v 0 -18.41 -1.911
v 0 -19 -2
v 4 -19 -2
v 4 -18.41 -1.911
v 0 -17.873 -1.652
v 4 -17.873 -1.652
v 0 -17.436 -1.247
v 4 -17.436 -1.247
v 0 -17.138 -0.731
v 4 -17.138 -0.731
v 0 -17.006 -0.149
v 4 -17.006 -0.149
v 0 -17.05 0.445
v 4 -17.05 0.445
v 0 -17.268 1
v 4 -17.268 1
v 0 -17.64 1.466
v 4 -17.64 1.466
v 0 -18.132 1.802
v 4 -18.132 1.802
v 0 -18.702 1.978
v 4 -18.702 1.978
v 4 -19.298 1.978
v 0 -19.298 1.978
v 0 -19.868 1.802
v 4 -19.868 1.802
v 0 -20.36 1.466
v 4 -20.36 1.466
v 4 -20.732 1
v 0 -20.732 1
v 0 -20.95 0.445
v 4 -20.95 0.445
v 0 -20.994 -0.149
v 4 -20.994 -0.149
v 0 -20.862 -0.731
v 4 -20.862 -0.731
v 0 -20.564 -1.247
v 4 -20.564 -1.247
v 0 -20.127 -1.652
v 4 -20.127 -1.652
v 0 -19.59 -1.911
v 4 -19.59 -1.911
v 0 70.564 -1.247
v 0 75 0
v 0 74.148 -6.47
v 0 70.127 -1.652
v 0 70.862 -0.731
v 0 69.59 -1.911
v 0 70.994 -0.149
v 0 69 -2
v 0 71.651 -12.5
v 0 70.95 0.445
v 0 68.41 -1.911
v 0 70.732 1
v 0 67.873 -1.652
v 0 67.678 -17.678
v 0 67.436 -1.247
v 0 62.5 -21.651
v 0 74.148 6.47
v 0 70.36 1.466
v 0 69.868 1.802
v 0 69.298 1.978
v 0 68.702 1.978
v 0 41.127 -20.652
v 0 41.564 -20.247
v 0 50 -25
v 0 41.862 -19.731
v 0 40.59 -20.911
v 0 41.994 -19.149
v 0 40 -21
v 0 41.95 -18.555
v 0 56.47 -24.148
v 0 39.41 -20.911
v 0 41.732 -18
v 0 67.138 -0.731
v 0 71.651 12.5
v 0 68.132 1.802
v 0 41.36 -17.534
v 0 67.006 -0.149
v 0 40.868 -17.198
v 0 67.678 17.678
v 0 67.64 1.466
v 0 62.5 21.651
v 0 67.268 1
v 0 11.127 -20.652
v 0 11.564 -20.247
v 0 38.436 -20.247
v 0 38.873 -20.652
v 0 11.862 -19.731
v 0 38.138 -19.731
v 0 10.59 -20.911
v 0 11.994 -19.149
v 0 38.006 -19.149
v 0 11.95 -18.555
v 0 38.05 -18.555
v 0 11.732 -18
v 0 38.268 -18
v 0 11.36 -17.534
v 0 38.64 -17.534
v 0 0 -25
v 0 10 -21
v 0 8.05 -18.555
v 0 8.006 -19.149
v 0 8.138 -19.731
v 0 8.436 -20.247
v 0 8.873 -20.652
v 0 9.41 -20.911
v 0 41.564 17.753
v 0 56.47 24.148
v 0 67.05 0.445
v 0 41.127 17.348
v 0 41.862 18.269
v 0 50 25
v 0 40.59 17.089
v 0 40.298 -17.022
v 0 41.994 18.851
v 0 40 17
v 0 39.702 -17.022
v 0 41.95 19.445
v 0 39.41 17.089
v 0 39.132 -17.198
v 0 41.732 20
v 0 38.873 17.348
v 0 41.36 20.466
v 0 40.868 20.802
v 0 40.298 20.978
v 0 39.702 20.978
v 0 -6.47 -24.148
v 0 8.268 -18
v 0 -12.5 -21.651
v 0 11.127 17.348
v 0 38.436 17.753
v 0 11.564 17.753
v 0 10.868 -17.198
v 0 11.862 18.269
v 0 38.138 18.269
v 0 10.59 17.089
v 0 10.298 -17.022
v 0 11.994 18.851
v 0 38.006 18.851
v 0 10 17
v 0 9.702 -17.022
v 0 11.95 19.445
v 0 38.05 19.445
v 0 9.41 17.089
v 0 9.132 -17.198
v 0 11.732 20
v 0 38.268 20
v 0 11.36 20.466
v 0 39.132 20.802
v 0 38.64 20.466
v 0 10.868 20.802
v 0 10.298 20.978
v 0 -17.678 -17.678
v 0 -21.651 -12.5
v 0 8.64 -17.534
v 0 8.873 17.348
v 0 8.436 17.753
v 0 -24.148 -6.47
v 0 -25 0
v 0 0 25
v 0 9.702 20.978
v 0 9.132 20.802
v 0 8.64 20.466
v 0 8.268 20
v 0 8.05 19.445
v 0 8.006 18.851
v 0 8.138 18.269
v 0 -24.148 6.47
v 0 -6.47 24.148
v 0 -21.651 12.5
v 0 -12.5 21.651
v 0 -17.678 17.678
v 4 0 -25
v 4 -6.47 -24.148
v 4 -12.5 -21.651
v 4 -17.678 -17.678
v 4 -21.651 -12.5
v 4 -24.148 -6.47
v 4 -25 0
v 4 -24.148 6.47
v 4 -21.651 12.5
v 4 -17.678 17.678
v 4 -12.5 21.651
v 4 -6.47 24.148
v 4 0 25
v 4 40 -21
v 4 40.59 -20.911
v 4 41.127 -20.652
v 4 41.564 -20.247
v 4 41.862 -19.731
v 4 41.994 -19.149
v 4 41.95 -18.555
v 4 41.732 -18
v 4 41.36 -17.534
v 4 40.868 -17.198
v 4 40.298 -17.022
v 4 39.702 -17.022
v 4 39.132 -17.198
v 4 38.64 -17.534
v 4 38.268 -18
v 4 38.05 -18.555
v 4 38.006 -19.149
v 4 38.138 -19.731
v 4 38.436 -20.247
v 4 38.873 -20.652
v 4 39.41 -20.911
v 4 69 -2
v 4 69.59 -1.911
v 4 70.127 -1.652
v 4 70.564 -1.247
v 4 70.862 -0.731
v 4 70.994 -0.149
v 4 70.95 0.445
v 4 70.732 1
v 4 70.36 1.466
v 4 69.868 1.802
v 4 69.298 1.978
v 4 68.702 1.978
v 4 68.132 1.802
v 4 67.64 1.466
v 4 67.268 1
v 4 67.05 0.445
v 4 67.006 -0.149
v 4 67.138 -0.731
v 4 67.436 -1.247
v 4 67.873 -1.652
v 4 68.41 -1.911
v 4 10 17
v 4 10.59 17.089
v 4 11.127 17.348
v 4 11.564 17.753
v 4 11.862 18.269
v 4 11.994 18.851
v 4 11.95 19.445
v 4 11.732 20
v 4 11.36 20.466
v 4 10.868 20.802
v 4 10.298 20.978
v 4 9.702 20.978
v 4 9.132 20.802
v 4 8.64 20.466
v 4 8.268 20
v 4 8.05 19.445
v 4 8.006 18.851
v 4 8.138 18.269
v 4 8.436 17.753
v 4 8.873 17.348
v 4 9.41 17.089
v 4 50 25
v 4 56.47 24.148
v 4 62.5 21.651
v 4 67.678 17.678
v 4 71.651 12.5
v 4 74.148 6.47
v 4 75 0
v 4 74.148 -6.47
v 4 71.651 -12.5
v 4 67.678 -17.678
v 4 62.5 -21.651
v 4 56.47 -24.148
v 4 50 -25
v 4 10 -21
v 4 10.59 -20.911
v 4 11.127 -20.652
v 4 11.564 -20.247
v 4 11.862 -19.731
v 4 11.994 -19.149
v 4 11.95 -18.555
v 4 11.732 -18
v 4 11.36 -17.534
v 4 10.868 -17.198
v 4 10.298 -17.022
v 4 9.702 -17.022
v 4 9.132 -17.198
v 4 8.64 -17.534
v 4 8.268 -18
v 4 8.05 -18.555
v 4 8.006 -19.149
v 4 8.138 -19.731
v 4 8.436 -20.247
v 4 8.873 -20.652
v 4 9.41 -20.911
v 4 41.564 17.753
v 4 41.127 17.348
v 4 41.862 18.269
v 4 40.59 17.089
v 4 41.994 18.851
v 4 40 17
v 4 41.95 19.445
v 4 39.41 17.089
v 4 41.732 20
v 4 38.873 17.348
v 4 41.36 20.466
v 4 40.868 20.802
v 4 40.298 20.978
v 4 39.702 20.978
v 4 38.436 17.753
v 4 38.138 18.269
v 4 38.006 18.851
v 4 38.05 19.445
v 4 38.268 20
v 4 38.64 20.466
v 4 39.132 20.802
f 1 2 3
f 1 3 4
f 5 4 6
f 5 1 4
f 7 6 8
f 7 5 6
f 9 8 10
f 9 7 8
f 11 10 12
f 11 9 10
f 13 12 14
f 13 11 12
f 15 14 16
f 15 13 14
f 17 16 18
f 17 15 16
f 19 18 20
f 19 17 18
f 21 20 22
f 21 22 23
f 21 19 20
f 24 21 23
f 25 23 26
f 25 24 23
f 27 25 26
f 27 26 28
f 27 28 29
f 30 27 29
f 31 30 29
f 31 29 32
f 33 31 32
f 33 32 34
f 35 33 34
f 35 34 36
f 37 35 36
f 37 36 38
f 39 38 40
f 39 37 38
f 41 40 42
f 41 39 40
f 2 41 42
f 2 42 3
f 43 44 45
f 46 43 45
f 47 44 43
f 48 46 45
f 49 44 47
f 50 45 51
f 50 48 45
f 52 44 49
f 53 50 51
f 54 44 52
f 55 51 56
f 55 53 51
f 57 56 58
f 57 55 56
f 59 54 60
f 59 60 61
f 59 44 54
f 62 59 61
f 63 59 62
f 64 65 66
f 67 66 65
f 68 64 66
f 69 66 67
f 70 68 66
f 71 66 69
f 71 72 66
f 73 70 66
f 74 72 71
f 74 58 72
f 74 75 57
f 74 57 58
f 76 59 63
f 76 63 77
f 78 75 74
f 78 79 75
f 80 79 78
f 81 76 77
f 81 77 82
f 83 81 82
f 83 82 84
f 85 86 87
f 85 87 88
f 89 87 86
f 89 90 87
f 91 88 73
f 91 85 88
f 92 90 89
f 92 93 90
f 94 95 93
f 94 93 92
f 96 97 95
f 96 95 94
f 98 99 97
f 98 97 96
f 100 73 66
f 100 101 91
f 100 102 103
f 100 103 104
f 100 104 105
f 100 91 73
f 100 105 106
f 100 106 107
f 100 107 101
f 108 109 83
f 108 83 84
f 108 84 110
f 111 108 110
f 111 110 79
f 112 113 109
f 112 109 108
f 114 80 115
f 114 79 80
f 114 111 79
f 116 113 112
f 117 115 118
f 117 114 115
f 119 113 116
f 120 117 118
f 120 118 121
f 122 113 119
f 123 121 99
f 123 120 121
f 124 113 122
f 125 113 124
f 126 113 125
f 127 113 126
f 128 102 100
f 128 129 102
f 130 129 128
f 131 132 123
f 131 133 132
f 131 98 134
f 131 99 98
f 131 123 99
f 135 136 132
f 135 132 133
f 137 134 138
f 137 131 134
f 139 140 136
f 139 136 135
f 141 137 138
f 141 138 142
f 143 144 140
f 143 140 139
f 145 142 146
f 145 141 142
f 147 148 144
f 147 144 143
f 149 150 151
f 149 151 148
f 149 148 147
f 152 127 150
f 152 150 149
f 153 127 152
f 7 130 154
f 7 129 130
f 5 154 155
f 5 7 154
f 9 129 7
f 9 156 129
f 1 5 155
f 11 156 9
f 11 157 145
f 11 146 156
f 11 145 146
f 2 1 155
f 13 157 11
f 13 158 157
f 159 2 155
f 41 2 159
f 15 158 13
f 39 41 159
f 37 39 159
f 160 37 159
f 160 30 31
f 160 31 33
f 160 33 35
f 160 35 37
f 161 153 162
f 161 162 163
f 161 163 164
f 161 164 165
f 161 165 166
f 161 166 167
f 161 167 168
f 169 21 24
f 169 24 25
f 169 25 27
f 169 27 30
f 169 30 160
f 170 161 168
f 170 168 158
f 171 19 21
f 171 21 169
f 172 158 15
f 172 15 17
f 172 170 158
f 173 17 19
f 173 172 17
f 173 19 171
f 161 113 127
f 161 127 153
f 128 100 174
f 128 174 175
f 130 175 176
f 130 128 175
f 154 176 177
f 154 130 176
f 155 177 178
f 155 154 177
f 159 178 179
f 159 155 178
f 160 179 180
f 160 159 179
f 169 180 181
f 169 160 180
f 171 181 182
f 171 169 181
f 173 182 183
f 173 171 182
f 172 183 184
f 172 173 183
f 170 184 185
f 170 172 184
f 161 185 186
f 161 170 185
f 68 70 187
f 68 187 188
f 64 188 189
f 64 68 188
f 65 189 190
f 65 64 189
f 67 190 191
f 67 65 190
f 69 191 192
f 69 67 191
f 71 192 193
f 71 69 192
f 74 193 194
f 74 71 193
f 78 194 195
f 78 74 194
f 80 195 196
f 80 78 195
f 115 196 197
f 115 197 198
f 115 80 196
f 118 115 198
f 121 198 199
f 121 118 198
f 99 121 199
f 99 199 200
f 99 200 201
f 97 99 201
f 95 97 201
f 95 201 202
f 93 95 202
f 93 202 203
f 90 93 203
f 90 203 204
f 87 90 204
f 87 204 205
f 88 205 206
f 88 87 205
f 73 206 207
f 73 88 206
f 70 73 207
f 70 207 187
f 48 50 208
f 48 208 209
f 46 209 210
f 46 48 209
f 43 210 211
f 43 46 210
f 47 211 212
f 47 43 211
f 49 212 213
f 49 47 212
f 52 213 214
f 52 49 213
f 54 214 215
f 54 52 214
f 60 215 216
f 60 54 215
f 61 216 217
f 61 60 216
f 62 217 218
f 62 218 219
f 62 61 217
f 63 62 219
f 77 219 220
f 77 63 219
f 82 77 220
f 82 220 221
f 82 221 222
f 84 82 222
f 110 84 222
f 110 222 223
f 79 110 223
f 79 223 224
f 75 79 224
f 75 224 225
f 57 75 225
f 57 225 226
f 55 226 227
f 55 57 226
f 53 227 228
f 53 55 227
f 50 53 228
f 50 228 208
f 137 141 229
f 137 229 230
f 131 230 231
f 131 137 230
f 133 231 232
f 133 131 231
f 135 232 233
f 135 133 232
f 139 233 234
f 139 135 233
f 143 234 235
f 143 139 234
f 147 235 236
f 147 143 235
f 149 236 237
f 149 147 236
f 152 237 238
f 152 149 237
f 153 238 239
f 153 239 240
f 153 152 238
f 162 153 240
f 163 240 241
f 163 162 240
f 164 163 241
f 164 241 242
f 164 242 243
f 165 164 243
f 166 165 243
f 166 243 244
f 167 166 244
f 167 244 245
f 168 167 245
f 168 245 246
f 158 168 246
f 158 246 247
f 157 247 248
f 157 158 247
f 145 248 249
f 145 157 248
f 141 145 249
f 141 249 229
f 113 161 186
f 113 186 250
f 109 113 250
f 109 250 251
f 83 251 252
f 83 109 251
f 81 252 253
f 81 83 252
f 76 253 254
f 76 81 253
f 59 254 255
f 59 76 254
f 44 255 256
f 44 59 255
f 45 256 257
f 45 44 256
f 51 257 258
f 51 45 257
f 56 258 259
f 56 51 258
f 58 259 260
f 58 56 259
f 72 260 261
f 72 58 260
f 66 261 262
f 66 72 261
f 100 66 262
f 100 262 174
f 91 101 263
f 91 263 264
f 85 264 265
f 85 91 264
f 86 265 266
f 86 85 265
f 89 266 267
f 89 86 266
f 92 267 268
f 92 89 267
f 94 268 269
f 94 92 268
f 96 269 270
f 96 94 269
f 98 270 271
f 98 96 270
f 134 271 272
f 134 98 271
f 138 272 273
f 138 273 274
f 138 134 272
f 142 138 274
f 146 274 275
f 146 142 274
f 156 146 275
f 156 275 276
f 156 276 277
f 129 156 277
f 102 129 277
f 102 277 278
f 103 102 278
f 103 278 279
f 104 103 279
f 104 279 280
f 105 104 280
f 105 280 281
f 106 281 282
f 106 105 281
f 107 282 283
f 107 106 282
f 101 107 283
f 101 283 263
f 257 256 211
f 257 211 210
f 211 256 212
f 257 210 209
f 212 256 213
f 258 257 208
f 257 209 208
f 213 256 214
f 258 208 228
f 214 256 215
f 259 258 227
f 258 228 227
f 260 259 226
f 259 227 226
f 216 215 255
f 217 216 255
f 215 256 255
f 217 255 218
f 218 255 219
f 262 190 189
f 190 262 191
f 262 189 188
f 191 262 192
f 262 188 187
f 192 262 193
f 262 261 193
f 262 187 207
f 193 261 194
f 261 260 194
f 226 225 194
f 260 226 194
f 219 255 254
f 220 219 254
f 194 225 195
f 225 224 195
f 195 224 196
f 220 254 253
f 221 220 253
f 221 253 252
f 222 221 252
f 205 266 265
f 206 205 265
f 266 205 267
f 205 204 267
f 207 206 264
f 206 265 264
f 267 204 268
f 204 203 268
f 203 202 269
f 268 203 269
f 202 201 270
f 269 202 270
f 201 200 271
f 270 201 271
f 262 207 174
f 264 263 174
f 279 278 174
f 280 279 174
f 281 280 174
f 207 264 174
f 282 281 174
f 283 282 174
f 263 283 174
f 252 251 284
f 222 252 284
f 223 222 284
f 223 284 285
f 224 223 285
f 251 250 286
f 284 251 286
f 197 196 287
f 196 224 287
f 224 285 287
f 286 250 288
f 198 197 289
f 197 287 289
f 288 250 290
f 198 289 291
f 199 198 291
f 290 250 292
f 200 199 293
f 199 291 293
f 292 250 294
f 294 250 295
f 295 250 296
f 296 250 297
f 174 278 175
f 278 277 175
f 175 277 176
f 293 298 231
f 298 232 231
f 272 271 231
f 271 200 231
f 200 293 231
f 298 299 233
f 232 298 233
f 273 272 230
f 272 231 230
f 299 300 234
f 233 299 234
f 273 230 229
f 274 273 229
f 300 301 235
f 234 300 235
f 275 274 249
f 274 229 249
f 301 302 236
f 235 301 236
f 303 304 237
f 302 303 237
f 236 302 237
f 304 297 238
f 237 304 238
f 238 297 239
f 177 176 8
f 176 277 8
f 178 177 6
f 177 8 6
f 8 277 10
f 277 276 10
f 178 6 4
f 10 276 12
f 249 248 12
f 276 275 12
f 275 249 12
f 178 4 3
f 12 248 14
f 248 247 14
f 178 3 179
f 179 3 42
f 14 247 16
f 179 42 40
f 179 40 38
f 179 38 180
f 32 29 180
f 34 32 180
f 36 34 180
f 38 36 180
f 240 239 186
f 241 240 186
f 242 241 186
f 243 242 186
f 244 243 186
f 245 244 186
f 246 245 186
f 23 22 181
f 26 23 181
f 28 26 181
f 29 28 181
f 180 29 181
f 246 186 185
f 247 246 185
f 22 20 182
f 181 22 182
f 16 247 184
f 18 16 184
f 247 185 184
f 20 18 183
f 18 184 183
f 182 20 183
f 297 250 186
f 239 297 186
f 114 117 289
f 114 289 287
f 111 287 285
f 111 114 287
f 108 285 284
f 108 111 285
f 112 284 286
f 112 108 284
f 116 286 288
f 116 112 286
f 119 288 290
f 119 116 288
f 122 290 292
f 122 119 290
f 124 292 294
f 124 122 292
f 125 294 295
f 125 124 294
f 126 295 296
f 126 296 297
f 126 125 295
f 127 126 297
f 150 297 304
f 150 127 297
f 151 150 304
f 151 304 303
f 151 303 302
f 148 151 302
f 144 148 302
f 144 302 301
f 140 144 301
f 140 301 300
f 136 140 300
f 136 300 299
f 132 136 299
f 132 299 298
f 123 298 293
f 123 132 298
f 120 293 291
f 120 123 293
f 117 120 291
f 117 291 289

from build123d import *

# Parameters (mm, degrees)
SKETCH1_R           = 2
BOSS_EXTRUDE1_DEPTH = 4


with BuildPart() as part:
    # Sketch1 → Boss-Extrude1 (new body)
    with BuildSketch(Plane.YZ):
        with BuildLine():
            Line((0, 25), (50, 25))
            ThreePointArc((50, 25), (75, 0), (50, -25))
            Line((50, -25), (0, -25))
            ThreePointArc((0, -25), (-25, 0), (0, 25))
        make_face()
        with Locations(Location((10, 19, 0), (0, 0, 270))):
            Circle(SKETCH1_R, mode=Mode.SUBTRACT)
        with Locations(Location((40, 19, 0), (0, 0, 270))):
            Circle(SKETCH1_R, mode=Mode.SUBTRACT)
        with Locations(Location((69, 0, 0), (0, 0, 270))):
            Circle(SKETCH1_R, mode=Mode.SUBTRACT)
        with Locations(Location((-19, 0, 0), (0, 0, 270))):
            Circle(SKETCH1_R, mode=Mode.SUBTRACT)
        with Locations(Location((10, -19, 0), (0, 0, 270))):
            Circle(SKETCH1_R, mode=Mode.SUBTRACT)
        with Locations(Location((40, -19, 0), (0, 0, 270))):
            Circle(SKETCH1_R, mode=Mode.SUBTRACT)
    extrude(amount=BOSS_EXTRUDE1_DEPTH)


solid = part.part
